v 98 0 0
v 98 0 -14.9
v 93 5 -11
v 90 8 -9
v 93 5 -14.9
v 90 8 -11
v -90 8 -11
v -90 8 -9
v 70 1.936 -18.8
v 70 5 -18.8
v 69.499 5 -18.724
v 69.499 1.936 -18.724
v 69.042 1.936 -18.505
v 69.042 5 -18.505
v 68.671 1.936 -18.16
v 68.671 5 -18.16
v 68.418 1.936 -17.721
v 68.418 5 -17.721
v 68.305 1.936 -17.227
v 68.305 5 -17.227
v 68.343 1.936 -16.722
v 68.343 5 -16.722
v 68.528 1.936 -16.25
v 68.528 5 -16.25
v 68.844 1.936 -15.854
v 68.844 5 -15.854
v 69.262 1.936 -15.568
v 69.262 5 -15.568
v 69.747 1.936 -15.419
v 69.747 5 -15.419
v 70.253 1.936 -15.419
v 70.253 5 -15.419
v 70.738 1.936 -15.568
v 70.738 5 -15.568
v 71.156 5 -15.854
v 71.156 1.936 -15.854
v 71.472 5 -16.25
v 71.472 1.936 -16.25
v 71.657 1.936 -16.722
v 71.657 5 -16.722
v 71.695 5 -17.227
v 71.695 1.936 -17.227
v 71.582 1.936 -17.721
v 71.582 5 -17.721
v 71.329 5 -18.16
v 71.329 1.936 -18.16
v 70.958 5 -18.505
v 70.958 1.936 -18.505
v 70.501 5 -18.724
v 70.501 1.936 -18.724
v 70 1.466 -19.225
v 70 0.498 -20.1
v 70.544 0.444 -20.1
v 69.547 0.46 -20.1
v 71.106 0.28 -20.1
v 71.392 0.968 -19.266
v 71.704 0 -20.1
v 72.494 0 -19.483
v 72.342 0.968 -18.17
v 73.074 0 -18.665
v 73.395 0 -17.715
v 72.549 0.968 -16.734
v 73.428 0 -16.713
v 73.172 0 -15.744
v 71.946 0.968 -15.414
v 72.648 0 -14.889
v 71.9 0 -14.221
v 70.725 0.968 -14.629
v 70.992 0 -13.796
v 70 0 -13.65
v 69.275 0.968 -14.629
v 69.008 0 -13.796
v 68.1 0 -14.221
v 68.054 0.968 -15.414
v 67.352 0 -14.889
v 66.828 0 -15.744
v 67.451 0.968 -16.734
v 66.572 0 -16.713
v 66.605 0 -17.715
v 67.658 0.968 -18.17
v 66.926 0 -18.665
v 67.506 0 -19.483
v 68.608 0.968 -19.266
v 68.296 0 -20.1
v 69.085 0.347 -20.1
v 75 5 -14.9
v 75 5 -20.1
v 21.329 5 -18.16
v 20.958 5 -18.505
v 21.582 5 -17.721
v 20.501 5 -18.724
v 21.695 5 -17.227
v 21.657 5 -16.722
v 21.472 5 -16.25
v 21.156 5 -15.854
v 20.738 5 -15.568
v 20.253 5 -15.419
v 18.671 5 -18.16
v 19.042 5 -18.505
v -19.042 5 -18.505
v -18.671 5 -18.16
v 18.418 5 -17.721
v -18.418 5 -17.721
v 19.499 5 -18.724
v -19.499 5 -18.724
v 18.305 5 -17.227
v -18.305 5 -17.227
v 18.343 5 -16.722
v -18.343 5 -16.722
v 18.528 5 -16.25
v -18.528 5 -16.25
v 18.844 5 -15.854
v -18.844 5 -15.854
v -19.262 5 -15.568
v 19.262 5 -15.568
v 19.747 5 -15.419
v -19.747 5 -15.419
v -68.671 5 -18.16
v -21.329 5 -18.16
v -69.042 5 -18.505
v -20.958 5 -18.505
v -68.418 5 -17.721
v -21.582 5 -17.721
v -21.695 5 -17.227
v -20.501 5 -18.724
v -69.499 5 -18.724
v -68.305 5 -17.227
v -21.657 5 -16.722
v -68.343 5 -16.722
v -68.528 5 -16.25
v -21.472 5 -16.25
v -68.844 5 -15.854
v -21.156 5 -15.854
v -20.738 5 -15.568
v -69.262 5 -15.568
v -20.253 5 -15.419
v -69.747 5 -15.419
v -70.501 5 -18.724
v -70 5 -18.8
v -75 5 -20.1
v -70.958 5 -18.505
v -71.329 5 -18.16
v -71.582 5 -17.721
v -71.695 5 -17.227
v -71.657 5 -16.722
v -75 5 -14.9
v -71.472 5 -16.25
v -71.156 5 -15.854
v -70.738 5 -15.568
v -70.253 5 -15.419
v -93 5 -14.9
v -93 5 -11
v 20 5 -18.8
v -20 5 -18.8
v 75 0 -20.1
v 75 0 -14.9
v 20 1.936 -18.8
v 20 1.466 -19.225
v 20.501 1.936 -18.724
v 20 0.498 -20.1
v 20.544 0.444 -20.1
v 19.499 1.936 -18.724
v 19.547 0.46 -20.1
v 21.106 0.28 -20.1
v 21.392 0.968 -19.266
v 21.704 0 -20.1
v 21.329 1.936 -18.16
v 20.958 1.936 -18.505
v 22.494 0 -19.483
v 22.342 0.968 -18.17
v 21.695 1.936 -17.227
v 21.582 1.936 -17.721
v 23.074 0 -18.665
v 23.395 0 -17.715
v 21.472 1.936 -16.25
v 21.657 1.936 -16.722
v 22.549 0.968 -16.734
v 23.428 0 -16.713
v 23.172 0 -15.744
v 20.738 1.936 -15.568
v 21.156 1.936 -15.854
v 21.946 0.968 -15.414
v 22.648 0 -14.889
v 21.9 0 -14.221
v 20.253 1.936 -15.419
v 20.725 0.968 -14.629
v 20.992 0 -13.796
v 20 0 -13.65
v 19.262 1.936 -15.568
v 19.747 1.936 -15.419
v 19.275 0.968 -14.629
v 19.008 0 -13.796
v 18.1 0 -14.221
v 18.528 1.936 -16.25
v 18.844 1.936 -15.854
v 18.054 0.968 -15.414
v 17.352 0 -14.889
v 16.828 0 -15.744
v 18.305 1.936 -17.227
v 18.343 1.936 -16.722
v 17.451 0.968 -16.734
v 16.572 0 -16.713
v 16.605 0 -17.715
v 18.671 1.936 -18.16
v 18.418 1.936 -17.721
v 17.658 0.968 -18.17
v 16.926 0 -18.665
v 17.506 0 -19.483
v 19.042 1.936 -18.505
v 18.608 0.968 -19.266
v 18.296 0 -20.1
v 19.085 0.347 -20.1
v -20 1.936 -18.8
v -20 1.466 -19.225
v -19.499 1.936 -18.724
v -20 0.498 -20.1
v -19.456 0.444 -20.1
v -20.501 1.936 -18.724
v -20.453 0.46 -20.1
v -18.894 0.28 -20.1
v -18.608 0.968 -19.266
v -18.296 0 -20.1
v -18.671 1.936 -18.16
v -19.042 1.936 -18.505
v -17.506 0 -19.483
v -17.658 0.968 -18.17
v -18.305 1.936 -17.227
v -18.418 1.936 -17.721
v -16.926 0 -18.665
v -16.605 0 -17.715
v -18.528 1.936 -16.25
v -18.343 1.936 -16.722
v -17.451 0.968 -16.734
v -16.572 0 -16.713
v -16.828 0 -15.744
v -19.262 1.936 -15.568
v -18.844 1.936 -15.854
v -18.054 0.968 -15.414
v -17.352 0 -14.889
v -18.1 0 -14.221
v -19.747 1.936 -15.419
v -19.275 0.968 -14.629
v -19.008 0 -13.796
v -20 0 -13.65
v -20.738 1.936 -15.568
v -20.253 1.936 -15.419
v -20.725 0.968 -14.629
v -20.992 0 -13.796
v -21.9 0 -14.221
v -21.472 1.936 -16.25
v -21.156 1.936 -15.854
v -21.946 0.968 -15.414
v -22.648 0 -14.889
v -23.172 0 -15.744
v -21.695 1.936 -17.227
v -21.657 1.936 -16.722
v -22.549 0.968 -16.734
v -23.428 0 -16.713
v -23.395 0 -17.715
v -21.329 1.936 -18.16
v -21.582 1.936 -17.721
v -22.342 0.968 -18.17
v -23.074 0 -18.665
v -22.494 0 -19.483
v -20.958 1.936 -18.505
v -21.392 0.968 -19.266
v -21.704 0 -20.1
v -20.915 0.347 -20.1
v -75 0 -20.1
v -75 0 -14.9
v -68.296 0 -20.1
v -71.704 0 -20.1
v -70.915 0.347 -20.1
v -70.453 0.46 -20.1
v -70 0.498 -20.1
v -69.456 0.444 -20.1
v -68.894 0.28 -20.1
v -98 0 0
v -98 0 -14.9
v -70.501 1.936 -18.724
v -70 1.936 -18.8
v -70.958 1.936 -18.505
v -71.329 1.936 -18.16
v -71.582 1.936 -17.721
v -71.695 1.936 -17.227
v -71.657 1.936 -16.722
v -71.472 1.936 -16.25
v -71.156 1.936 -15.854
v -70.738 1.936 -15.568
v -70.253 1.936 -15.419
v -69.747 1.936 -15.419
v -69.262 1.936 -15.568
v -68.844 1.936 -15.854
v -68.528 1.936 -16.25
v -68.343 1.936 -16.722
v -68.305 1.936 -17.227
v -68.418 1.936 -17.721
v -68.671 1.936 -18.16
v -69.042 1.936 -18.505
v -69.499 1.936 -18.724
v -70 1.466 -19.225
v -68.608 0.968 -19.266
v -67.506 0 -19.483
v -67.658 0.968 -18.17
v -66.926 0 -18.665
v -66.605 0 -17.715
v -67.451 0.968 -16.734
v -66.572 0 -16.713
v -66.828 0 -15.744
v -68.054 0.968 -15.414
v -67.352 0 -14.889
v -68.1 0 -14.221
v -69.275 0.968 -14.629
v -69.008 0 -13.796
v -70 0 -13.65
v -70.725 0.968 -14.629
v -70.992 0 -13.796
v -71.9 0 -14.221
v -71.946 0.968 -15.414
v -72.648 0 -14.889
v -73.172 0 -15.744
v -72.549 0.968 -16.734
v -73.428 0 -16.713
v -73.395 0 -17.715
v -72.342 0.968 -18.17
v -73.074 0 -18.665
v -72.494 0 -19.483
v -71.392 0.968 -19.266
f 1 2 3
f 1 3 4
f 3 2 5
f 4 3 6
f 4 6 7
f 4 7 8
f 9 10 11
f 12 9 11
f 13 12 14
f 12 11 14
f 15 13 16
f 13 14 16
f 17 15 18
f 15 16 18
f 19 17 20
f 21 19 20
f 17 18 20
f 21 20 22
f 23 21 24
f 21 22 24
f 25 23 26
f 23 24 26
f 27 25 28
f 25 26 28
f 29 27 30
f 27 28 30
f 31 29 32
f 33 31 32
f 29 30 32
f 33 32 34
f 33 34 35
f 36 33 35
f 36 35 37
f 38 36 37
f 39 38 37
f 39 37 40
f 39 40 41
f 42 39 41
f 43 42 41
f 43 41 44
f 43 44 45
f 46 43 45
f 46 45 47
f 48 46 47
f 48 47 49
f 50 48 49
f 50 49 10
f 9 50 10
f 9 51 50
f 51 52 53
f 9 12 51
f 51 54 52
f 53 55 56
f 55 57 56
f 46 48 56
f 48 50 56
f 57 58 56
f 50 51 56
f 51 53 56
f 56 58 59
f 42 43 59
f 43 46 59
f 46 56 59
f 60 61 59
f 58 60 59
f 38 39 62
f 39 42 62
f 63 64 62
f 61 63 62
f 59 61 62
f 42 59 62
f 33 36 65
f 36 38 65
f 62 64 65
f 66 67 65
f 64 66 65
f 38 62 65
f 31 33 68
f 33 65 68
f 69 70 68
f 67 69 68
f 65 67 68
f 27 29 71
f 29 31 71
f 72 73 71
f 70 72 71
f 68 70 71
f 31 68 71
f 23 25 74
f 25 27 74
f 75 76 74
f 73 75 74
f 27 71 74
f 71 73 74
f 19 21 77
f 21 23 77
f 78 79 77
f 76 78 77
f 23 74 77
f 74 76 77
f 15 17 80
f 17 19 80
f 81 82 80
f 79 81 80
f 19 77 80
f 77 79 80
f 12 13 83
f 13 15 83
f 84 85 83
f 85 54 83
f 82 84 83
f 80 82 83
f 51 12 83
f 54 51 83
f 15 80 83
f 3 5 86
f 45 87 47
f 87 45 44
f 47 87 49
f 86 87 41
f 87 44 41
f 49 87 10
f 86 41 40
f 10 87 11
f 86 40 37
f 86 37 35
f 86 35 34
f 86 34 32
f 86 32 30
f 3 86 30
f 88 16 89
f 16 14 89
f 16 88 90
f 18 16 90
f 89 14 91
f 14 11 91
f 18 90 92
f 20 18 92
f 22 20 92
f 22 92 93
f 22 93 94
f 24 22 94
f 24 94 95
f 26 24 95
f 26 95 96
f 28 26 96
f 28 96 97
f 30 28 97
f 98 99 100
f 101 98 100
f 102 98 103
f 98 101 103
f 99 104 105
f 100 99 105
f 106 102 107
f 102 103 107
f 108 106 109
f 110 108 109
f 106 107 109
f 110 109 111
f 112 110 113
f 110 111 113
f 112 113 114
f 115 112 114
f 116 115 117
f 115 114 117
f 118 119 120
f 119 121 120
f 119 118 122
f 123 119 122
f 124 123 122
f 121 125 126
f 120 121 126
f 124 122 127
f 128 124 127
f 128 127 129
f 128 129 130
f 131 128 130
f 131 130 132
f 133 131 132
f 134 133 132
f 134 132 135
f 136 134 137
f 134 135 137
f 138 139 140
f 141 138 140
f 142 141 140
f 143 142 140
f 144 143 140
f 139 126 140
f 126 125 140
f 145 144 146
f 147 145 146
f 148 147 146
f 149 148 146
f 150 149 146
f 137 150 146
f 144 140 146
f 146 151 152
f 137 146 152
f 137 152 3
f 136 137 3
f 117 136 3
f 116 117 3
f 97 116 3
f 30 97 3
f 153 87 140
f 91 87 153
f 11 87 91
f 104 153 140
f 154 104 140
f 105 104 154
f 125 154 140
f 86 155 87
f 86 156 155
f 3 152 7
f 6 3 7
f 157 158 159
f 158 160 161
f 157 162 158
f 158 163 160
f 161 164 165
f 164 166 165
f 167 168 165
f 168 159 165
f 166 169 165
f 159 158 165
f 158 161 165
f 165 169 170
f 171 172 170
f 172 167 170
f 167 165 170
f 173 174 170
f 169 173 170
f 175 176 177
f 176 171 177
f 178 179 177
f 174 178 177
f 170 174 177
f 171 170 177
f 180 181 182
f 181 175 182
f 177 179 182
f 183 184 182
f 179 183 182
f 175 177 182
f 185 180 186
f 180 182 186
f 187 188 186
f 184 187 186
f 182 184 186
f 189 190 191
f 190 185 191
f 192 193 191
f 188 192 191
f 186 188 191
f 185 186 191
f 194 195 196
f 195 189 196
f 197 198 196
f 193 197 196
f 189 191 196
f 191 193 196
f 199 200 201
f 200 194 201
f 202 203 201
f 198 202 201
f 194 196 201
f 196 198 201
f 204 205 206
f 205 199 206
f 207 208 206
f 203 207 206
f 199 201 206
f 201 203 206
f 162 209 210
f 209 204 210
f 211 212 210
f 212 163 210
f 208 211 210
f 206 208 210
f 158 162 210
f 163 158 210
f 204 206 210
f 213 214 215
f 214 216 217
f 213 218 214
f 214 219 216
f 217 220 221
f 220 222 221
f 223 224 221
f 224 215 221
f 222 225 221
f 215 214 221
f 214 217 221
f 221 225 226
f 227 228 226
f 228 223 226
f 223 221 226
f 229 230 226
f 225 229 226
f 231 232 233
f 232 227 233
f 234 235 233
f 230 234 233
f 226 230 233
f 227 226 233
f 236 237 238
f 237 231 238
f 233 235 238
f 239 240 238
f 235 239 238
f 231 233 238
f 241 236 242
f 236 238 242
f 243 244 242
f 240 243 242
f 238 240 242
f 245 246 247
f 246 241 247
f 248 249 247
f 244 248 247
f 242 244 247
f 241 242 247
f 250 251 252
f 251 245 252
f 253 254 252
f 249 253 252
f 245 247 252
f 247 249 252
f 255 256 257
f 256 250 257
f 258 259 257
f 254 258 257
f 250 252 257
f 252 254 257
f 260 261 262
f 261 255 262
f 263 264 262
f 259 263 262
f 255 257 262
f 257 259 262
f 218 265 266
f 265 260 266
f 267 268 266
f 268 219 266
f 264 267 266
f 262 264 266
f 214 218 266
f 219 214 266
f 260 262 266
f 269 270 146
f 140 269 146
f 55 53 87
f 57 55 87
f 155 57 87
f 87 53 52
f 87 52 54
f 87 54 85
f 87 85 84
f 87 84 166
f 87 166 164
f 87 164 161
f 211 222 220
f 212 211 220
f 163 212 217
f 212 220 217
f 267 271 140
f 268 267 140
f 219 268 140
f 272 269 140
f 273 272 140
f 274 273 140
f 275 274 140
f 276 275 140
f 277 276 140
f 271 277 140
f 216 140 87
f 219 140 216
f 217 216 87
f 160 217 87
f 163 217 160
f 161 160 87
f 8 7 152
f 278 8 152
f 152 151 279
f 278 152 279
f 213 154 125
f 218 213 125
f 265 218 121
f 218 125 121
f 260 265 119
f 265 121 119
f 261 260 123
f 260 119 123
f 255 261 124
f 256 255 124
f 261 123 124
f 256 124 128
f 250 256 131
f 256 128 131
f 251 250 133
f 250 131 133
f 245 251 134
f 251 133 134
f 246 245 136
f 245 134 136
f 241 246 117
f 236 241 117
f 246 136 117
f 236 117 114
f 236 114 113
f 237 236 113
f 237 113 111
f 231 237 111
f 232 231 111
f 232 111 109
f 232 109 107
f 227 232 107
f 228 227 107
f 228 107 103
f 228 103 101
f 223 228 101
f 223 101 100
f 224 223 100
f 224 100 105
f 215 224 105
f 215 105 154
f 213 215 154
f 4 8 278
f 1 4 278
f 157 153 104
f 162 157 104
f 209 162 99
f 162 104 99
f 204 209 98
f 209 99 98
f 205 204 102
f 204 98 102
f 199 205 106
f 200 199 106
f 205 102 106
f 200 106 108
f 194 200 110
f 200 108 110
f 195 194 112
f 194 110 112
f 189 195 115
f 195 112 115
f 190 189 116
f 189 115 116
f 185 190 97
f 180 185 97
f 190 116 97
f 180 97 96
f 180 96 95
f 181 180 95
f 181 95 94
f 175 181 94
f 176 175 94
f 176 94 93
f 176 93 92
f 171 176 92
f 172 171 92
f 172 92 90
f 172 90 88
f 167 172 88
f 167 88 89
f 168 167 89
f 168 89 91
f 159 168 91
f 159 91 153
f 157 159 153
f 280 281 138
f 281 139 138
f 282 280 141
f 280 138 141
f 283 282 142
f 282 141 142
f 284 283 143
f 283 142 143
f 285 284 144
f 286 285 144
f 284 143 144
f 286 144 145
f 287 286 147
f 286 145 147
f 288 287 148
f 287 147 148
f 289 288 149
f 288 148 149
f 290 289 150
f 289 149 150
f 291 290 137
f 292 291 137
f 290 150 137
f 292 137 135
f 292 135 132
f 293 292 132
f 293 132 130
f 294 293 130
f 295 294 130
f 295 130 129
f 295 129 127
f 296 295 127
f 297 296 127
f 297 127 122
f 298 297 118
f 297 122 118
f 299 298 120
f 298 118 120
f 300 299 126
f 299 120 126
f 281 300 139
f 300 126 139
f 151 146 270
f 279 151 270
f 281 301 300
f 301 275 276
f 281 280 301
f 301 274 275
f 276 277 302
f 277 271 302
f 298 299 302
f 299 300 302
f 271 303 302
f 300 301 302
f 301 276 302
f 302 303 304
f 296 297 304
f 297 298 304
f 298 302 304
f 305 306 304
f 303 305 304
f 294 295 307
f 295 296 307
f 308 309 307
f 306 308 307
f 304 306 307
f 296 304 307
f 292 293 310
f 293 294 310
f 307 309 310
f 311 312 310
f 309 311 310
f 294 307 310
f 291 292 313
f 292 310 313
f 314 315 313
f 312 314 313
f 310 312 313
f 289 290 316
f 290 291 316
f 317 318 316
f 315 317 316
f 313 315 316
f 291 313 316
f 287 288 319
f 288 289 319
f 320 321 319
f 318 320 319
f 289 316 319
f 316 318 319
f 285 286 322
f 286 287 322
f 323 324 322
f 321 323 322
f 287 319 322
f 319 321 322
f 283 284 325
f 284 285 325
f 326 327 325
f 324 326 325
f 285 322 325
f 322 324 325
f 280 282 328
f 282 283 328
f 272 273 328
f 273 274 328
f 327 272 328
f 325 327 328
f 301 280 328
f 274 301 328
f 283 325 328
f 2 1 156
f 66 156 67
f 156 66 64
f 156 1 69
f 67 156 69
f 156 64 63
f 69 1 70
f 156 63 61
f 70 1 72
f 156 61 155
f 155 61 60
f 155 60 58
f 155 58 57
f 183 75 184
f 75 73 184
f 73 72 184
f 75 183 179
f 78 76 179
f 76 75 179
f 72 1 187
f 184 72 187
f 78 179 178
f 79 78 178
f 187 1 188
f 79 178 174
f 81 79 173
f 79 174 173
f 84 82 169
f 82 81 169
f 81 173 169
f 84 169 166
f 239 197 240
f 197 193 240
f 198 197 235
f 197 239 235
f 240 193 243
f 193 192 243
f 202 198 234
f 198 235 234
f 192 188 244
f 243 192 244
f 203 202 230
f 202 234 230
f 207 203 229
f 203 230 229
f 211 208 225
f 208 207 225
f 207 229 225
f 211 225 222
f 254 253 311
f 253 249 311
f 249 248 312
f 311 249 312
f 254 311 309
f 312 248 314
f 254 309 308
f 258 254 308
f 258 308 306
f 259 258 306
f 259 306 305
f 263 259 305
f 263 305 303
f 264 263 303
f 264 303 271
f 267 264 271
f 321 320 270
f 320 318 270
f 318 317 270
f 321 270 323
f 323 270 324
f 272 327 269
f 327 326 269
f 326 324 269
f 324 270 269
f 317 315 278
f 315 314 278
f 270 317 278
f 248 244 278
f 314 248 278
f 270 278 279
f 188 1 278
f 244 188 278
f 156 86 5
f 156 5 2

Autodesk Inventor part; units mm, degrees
ref_plane "YZ Plane" through (0, 0, 0) normal (1, 0, 0) x (0, 1, 0)
ref_plane "XZ Plane" through (0, 0, 0) normal (0, 1, 0) x (-1, 0, 0)
ref_plane "XY Plane" through (0, 0, 0) normal (0, 0, 1) x (1, 0, 0)
sketch "Szkic1" plane through (0, 0, 0) normal (1, 0, 0) x (0, 1, 0)
  line L0 (0, 0) -> (0, -20.1)
  line L1 (0, -20.1) -> (8, -20.1)
  line L2 (8, -20.1) -> (8, -9)
  line L3 (8, -9) -> (0, 0)
  line L4 (8, -20.1) -> (5, -20.1)
  line L5 (5, -20.1) -> (5, -11)
  line L6 (5, -11) -> (8, -11)
  line L7 (8, -11) -> (8, -20.1)
  line L8 (5, -14.9) -> (0, -14.9)
  dimension "d0" = 20.1
  dimension "d2" = 8
  dimension "d4" = 3
  dimension "d5" = 5.2
  dimension "d25" = 11
  dimension "d26" = 2
extrude "Wyciągnięcie proste1" add sketch "Szkic1" along normal mid plane 196 contours L3 L2 L6 L5 L8 L0
extrude "Wyciągnięcie proste2" add sketch "Szkic1" along normal mid plane 150 contours L8 L5 L1 L0
sketch "Szkic3" plane through (-98, 0, 0) normal (0, -1, 0) x (1, 0, 0)
  line L0 (98, 0) -> (98, -20.1) construction
  line L1 (23, -20.1) -> (173, -20.1) construction
  point P0 (168, -17.1)
  point P1 (118, -17.1)
  point P2 (28, -17.1)
  point P3 (78, -17.1)
  dimension "d12" = 20
  dimension "d13" = 70
  dimension "d14" = 3
hole "Otwór1" at (70, 0, -17.1) at (20, 0, -17.1) at (-20, 0, -17.1) at (-70, 0, -17.1) direction (0, 1, 0) diameter 3.4 end through all countersink diameter 6.9 countersink angle 84.225 clearance for "Śruba ze łbem stożkowym ISO 2009/7046" size "M3" standard "ISO"
sketch "Szkic4" plane through (75, 5, -20.1) normal (0, 0, -1) x (-1, 0, 0)
  line L0 (-23, 3) -> (-23, -5) projected
  line L1 (-23, -5) -> (-15, 3)
  line L2 (-23, 3) -> (173, 3) construction
  line L3 (-23, 3) -> (-23, -5)
  line L4 (-23, -5) -> (173, -5) construction
  line L5 (173, -5) -> (173, 3)
  line L6 (173, 3) -> (165, 3)
  line L7 (165, 3) -> (173, -5)
  line L8 (-23, 3) -> (-15, 3)
  point P0 (75, -5)
  dimension "d22" = 45
extrude "Wyciągnięcie proste3" cut sketch "Szkic4" against normal through all
properties part number "PlogPiramida"
